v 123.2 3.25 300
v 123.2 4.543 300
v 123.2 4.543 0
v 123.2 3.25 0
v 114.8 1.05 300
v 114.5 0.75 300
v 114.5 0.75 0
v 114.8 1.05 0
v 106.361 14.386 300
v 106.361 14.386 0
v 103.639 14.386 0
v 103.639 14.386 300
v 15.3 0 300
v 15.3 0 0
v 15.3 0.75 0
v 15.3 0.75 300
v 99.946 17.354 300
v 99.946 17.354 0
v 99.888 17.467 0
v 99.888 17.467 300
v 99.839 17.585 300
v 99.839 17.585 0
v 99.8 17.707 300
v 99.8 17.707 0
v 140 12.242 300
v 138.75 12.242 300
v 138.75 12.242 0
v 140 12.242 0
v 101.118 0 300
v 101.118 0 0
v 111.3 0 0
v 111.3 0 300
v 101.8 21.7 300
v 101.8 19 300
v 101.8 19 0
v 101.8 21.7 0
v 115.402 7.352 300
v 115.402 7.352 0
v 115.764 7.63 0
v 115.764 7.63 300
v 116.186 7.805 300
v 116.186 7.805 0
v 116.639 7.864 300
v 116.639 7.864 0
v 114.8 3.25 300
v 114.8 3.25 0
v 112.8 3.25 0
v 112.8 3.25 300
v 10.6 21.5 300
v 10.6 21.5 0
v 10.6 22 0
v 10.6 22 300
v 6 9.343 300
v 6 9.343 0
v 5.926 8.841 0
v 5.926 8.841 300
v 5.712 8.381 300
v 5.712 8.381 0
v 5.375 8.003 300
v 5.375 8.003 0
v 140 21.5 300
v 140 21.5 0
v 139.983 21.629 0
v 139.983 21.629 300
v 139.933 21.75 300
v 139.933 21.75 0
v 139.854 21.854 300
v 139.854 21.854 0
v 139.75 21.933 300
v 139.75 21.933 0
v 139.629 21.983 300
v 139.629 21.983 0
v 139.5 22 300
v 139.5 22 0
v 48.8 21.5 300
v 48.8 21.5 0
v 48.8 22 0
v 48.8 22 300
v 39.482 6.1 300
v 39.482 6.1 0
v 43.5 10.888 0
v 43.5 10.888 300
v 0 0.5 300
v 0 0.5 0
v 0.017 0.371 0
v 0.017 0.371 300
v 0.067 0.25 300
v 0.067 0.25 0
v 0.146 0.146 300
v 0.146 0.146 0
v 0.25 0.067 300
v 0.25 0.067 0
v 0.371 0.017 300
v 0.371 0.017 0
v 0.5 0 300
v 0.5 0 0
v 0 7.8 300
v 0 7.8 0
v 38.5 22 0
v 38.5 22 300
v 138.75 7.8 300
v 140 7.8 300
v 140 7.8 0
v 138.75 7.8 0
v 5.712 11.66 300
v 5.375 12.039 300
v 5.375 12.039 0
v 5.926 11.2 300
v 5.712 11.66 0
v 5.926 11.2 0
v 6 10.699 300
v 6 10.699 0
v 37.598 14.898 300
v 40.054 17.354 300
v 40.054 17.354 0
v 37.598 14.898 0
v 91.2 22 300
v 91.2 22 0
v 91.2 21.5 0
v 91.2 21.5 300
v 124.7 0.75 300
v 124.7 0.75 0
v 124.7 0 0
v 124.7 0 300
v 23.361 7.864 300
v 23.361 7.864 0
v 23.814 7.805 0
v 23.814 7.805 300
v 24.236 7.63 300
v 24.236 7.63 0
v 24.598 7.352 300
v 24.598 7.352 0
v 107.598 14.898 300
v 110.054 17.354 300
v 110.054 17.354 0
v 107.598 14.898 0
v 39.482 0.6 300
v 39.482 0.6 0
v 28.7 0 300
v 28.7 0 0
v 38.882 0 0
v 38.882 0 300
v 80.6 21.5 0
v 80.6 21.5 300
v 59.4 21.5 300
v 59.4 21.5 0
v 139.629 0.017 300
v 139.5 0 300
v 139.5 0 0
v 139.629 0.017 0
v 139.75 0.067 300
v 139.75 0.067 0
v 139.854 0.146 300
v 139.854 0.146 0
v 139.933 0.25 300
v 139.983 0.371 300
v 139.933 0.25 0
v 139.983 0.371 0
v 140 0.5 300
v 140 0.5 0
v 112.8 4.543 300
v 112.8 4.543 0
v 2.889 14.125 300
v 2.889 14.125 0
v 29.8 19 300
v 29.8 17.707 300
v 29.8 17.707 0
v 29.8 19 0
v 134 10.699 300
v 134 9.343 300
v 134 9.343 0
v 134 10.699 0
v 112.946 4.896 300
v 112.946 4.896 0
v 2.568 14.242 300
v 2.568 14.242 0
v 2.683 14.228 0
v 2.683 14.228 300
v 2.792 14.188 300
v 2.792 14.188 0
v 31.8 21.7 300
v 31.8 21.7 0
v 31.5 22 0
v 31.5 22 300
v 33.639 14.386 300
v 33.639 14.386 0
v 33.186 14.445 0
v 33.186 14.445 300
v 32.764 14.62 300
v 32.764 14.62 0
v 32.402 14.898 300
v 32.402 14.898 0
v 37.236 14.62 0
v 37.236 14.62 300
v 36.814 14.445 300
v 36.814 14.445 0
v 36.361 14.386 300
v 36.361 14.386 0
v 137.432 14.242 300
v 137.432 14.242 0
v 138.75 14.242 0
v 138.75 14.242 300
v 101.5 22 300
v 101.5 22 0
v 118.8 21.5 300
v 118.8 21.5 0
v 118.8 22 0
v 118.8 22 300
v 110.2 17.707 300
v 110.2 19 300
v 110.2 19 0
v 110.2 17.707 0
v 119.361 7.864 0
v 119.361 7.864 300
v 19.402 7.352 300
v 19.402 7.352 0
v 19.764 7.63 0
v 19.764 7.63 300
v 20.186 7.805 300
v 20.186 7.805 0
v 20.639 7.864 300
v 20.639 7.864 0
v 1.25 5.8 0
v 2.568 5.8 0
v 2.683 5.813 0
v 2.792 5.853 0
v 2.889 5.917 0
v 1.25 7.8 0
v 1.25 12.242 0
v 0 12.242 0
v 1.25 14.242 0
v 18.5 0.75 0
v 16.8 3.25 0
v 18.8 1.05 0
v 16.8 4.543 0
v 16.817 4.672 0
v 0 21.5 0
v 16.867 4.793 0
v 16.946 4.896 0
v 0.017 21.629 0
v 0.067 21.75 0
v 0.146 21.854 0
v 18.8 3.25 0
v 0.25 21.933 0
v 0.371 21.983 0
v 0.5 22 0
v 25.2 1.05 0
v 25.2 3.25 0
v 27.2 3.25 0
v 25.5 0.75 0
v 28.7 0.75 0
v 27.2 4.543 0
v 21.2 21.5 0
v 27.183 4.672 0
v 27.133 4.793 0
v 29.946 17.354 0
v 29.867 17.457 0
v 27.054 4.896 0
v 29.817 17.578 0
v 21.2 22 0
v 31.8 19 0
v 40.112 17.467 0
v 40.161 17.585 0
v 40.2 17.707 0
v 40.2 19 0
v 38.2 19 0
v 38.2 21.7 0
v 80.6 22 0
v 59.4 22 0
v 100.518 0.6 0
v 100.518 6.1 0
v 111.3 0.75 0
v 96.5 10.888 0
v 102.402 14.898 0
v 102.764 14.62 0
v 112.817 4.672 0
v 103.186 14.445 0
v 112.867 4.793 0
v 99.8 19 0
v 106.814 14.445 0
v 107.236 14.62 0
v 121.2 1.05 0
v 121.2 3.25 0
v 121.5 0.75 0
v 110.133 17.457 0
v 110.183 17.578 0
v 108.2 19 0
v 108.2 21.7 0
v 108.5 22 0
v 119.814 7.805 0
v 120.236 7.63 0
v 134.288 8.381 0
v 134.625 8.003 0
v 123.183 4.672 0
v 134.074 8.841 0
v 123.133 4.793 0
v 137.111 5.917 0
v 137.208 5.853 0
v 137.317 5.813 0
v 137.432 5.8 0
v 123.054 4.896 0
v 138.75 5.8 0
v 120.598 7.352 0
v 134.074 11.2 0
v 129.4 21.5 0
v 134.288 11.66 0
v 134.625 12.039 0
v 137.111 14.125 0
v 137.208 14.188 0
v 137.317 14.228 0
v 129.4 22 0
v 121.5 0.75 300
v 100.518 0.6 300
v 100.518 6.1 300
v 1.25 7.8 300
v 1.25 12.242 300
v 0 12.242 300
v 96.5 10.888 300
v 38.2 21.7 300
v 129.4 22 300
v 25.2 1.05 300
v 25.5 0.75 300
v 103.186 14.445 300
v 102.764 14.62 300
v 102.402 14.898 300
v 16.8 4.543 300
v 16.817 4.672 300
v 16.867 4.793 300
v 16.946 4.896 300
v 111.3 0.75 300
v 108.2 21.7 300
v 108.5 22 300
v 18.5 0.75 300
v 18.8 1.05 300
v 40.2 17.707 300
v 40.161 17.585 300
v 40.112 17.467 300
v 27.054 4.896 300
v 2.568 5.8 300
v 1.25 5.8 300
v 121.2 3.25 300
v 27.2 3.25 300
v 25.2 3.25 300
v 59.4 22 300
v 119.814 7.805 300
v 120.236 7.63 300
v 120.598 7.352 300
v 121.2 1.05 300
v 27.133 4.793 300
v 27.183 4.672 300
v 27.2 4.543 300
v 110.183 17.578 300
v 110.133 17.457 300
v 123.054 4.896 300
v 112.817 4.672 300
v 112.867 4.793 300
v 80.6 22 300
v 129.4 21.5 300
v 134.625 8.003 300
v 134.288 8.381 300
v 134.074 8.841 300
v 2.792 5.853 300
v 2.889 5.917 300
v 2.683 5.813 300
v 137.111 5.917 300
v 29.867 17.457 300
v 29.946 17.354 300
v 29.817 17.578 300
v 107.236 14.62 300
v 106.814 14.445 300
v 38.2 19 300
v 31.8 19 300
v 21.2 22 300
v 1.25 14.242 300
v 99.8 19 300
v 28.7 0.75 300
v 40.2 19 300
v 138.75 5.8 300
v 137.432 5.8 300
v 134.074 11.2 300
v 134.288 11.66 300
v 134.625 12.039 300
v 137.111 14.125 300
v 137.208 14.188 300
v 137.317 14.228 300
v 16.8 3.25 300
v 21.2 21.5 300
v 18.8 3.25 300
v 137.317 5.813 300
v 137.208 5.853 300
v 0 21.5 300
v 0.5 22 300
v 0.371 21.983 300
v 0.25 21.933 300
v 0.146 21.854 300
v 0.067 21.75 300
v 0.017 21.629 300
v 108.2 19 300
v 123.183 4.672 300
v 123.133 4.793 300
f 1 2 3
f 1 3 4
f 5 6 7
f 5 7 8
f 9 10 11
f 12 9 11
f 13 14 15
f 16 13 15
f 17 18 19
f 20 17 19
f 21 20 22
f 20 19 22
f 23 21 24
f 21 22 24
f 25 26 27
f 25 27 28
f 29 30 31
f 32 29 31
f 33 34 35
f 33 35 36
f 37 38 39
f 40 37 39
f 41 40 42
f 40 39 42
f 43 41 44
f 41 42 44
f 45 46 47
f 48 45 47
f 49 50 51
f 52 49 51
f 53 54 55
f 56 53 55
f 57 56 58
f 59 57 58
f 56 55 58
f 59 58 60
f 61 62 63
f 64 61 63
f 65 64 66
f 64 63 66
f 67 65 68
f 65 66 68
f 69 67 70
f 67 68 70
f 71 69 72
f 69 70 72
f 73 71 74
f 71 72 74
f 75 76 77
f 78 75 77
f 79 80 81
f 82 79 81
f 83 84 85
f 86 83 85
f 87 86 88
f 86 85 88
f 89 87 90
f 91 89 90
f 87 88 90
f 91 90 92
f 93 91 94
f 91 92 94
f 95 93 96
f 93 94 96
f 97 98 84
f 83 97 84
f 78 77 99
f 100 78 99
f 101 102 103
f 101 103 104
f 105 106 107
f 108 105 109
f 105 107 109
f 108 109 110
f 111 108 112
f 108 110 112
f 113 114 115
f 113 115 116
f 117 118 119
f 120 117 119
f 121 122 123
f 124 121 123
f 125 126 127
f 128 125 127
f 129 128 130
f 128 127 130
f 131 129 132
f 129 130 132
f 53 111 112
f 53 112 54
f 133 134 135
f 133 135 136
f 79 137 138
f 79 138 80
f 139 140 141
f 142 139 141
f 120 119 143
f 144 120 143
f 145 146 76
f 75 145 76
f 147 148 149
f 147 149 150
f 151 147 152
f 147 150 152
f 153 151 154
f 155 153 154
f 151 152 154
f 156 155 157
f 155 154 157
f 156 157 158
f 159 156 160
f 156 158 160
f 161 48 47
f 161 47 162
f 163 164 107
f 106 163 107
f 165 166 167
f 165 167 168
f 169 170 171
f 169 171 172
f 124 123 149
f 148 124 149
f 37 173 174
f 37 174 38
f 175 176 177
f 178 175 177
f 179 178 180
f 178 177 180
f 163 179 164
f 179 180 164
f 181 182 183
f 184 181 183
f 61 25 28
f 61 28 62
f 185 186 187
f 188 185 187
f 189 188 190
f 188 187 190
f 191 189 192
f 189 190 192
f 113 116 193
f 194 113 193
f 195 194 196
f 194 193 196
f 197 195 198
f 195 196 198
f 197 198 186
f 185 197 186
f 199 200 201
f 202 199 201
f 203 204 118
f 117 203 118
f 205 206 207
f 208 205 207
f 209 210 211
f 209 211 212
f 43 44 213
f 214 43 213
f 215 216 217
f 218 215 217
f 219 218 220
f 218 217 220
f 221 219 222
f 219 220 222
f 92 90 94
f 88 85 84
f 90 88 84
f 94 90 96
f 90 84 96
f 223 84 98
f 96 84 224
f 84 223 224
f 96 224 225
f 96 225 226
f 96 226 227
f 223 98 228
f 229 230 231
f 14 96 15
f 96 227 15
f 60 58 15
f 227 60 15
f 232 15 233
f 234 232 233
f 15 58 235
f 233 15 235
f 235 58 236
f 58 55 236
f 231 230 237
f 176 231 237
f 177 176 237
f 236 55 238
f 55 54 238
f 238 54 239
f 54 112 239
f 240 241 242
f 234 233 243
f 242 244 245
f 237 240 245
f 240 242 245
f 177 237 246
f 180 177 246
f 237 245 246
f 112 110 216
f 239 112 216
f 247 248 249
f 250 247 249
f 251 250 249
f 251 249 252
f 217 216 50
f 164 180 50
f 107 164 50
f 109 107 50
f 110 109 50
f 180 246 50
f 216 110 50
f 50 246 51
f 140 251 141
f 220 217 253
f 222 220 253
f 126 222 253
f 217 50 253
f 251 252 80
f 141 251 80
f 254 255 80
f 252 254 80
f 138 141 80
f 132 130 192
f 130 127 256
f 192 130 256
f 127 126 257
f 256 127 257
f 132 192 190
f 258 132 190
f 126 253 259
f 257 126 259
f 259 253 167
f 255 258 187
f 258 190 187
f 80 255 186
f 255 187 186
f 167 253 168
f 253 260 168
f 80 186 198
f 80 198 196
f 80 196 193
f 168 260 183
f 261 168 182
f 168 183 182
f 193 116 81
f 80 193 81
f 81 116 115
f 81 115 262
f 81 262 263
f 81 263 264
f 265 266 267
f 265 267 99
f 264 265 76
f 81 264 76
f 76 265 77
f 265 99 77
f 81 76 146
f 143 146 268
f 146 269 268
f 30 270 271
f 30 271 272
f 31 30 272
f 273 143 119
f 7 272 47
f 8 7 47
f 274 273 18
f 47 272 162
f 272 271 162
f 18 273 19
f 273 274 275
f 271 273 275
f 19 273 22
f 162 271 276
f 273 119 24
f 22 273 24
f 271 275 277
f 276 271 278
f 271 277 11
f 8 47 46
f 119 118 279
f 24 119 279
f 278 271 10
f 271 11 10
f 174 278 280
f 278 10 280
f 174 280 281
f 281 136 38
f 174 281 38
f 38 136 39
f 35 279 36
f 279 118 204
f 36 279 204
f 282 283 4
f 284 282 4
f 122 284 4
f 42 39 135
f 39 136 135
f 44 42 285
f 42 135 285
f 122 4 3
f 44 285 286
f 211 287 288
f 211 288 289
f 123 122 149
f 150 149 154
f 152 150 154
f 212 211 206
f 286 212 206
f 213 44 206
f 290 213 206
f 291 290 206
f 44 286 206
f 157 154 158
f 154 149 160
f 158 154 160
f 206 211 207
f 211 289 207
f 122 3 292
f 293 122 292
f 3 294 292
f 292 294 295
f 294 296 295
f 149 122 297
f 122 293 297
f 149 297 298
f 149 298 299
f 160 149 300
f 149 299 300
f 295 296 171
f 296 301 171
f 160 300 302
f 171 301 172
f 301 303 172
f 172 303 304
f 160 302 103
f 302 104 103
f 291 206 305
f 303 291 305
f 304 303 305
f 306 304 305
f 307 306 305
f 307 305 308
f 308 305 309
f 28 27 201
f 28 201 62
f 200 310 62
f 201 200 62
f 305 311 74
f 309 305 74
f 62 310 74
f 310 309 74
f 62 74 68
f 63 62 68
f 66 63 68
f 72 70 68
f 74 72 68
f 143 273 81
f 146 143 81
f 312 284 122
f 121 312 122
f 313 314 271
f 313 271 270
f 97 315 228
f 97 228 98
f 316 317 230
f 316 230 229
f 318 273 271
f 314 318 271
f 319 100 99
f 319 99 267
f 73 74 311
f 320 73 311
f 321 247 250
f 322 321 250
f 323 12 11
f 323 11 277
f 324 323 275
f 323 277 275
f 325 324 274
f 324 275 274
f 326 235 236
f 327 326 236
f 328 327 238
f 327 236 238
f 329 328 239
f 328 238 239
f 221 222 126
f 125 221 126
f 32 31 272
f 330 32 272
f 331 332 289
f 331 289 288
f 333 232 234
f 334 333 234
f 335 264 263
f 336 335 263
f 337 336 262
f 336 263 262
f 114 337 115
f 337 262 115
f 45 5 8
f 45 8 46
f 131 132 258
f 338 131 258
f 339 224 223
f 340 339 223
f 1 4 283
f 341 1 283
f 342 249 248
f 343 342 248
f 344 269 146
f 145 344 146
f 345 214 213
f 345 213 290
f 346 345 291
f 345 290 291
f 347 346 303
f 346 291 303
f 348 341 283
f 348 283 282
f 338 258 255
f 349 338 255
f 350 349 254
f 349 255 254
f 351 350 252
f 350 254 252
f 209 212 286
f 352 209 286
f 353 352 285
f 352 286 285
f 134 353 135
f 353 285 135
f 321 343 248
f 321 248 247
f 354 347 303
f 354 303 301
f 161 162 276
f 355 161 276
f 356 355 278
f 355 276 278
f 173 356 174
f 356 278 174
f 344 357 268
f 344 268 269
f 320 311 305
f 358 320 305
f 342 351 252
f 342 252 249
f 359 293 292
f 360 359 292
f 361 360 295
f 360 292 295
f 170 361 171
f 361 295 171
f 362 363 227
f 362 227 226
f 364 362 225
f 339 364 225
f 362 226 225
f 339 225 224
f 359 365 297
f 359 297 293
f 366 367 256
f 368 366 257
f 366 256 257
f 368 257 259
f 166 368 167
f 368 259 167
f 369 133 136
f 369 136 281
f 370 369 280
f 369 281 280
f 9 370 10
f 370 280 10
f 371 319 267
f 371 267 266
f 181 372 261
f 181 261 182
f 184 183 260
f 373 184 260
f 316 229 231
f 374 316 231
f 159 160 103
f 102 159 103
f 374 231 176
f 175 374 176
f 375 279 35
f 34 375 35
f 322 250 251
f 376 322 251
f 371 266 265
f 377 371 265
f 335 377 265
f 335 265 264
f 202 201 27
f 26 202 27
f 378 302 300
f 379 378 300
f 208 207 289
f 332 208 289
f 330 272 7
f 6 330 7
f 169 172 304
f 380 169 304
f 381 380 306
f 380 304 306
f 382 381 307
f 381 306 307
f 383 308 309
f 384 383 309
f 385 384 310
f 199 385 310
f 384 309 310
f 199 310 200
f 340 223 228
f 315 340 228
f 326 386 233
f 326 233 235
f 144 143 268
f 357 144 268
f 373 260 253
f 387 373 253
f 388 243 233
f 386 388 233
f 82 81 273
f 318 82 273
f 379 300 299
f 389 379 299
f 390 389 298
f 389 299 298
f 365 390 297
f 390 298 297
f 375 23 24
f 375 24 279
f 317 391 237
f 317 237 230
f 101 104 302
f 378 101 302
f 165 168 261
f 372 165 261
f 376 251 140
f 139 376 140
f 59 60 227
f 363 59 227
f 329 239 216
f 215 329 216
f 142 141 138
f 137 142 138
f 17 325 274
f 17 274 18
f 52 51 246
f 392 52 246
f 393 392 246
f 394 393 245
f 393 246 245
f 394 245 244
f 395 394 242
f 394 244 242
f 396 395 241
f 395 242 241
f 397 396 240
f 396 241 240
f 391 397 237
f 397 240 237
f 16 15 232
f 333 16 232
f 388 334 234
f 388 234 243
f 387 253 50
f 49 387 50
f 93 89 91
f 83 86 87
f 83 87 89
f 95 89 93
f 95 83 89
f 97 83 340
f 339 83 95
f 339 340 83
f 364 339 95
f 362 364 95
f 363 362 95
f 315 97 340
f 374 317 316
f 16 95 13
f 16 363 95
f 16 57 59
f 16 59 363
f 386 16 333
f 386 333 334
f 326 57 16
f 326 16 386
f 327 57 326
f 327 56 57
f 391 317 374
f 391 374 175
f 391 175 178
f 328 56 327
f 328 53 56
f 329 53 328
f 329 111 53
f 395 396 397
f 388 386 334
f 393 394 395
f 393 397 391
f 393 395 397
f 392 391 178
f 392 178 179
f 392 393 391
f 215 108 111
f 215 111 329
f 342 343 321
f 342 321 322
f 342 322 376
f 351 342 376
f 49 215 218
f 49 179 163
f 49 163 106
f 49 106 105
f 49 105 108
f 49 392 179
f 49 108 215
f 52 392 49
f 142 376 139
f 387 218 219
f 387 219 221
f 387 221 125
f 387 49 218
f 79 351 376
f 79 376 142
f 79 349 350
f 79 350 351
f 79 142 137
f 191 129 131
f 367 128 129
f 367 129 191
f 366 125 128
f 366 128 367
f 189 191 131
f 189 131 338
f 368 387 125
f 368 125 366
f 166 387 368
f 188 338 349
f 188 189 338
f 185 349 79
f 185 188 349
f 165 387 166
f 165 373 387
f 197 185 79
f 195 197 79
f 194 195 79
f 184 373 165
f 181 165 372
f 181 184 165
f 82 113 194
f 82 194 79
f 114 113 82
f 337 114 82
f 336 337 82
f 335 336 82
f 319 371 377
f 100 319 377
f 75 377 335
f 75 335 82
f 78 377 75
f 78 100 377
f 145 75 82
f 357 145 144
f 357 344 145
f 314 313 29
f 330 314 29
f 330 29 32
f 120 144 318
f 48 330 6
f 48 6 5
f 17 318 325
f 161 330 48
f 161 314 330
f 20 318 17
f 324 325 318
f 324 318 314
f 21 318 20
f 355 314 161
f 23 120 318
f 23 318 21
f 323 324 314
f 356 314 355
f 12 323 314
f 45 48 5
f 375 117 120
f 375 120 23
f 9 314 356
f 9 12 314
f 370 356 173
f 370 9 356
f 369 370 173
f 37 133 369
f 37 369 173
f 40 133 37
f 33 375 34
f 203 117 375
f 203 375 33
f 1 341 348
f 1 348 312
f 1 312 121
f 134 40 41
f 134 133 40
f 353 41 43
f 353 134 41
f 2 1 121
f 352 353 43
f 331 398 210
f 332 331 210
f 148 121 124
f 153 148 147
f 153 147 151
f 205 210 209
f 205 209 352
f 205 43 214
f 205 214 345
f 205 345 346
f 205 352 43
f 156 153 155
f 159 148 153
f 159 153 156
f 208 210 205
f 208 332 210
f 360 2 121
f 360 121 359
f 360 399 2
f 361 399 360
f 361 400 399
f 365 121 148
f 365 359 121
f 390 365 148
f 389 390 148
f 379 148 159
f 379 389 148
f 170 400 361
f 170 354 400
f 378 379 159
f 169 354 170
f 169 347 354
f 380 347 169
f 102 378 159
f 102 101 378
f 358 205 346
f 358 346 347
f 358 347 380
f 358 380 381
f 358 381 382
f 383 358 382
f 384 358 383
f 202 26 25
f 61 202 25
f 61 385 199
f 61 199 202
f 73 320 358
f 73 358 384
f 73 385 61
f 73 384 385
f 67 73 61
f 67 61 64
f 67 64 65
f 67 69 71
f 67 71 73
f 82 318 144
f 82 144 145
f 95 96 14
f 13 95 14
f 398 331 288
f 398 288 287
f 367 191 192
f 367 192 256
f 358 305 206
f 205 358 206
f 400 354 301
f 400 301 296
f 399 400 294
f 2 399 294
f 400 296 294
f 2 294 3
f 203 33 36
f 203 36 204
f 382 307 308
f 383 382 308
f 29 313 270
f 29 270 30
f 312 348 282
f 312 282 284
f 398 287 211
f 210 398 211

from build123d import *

# Parameters (mm, degrees)
Y_KSEKLIK_EKSTR_ZYON1_DEPTH = 300


with BuildPart() as part:
    # Çizim1 → Yükseklik-Ekstrüzyon1 (new body)
    with BuildSketch(Plane.XY):
        with BuildLine():
            Line((0.5, 0), (15.3, 0))
            Line((15.3, 0), (15.3, 0.75))
            Line((15.3, 0.75), (18.5, 0.75))
            Line((18.5, 0.75), (18.8, 1.05))
            Line((18.8, 1.05), (18.8, 3.25))
            Line((18.8, 3.25), (16.8, 3.25))
            Line((16.8, 3.25), (16.8, 4.542893219))
            ThreePointArc((16.8, 4.542893219), (16.838060234, 4.734234935), (16.946446609, 4.896446609))
            Line((16.946446609, 4.896446609), (19.401845417, 7.351845417))
            ThreePointArc((19.401845417, 7.351845417), (19.969586278, 7.731197732), (20.639282284, 7.86440855))
            Line((20.639282284, 7.86440855), (23.360717716, 7.86440855))
            ThreePointArc((23.360717716, 7.86440855), (24.030413722, 7.731197732), (24.598154583, 7.351845417))
            Line((24.598154583, 7.351845417), (27.053553391, 4.896446609))
            ThreePointArc((27.053553391, 4.896446609), (27.161939766, 4.734234935), (27.2, 4.542893219))
            Line((27.2, 4.542893219), (27.2, 3.25))
            Line((27.2, 3.25), (25.2, 3.25))
            Line((25.2, 3.25), (25.2, 1.05))
            Line((25.2, 1.05), (25.5, 0.75))
            Line((25.5, 0.75), (28.7, 0.75))
            Line((28.7, 0.75), (28.7, 0))
            Line((28.7, 0), (38.882330038, 0))
            Line((38.882330038, 0), (39.482330038, 0.6))
            Line((39.482330038, 0.6), (39.482330038, 6.1))
            Line((39.482330038, 6.1), (43.5, 10.888072611))
            Line((43.5, 10.888072611), (96.5, 10.888072611))
            Line((96.5, 10.888072611), (100.517669962, 6.1))
            Line((100.517669962, 6.1), (100.517669962, 0.6))
            Line((100.517669962, 0.6), (101.117669962, 0))
            Line((101.117669962, 0), (111.3, 0))
            Line((111.3, 0), (111.3, 0.75))
            Line((111.3, 0.75), (114.5, 0.75))
            Line((114.5, 0.75), (114.8, 1.05))
            Line((114.8, 1.05), (114.8, 3.25))
            Line((114.8, 3.25), (112.8, 3.25))
            Line((112.8, 3.25), (112.8, 4.542893219))
            ThreePointArc((112.8, 4.542893219), (112.838060234, 4.734234935), (112.946446609, 4.896446609))
            Line((112.946446609, 4.896446609), (115.401845417, 7.351845417))
            ThreePointArc((115.401845417, 7.351845417), (115.969586278, 7.731197732), (116.639282284, 7.86440855))
            Line((116.639282284, 7.86440855), (119.360717716, 7.86440855))
            ThreePointArc((119.360717716, 7.86440855), (120.030413722, 7.731197732), (120.598154583, 7.351845417))
            Line((120.598154583, 7.351845417), (123.053553391, 4.896446609))
            ThreePointArc((123.053553391, 4.896446609), (123.161939766, 4.734234935), (123.2, 4.542893219))
            Line((123.2, 4.542893219), (123.2, 3.25))
            Line((123.2, 3.25), (121.2, 3.25))
            Line((121.2, 3.25), (121.2, 1.05))
            Line((121.2, 1.05), (121.5, 0.75))
            Line((121.5, 0.75), (124.7, 0.75))
            Line((124.7, 0.75), (124.7, 0))
            Line((124.7, 0), (139.5, 0))
            ThreePointArc((139.5, 0), (139.853553391, 0.146446609), (140, 0.5))
            Line((140, 0.5), (140, 7.8))
            Line((140, 7.8), (138.75, 7.8))
            Line((138.75, 7.8), (138.75, 5.8))
            Line((138.75, 5.8), (137.431985117, 5.8))
            ThreePointArc((137.431985117, 5.8), (137.260975045, 5.83015369), (137.110591312, 5.916977778))
            Line((137.110591312, 5.916977778), (134.625121683, 8.002534428))
            ThreePointArc((134.625121683, 8.002534428), (134.163961373, 8.603530245), (134, 9.343112203))
            Line((134, 9.343112203), (134, 10.698544282))
            ThreePointArc((134, 10.698544282), (134.163961373, 11.43812624), (134.625121683, 12.039122058))
            Line((134.625121683, 12.039122058), (137.110591312, 14.124678707))
            ThreePointArc((137.110591312, 14.124678707), (137.260975045, 14.211502796), (137.431985117, 14.241656485))
            Line((137.431985117, 14.241656485), (138.75, 14.241656485))
            Line((138.75, 14.241656485), (138.75, 12.241656485))
            Line((138.75, 12.241656485), (140, 12.241656485))
            Line((140, 12.241656485), (140, 21.5))
            ThreePointArc((140, 21.5), (139.853553391, 21.853553391), (139.5, 22))
            Line((139.5, 22), (129.4, 22))
            Line((129.4, 22), (129.4, 21.5))
            Line((129.4, 21.5), (118.8, 21.5))
            Line((118.8, 21.5), (118.8, 22))
            Line((118.8, 22), (108.5, 22))
            Line((108.5, 22), (108.2, 21.7))
            Line((108.2, 21.7), (108.2, 19))
            Line((108.2, 19), (110.2, 19))
            Line((110.2, 19), (110.2, 17.707106781))
            ThreePointArc((110.2, 17.707106781), (110.161939766, 17.515765065), (110.053553391, 17.353553391))
            Line((110.053553391, 17.353553391), (107.598154583, 14.898154583))
            ThreePointArc((107.598154583, 14.898154583), (107.030413722, 14.518802268), (106.360717716, 14.38559145))
            Line((106.360717716, 14.38559145), (103.639282284, 14.38559145))
            ThreePointArc((103.639282284, 14.38559145), (102.969586278, 14.518802268), (102.401845417, 14.898154583))
            Line((102.401845417, 14.898154583), (99.946446609, 17.353553391))
            ThreePointArc((99.946446609, 17.353553391), (99.86234478, 17.525824053), (99.8, 17.707106781))
            Line((99.8, 17.707106781), (99.8, 19))
            Line((99.8, 19), (101.8, 19))
            Line((101.8, 19), (101.8, 21.7))
            Line((101.8, 21.7), (101.5, 22))
            Line((101.5, 22), (91.2, 22))
            Line((91.2, 22), (91.2, 21.5))
            Line((91.2, 21.5), (80.6, 21.5))
            Line((80.6, 21.5), (80.6, 22))
            Line((80.6, 22), (59.4, 22))
            Line((59.4, 22), (59.4, 21.5))
            Line((59.4, 21.5), (48.8, 21.5))
            Line((48.8, 21.5), (48.8, 22))
            Line((48.8, 22), (38.5, 22))
            Line((38.5, 22), (38.2, 21.7))
            Line((38.2, 21.7), (38.2, 19))
            Line((38.2, 19), (40.2, 19))
            Line((40.2, 19), (40.2, 17.707106781))
            ThreePointArc((40.2, 17.707106781), (40.13765522, 17.525824053), (40.053553391, 17.353553391))
            Line((40.053553391, 17.353553391), (37.598154583, 14.898154583))
            ThreePointArc((37.598154583, 14.898154583), (37.030413722, 14.518802268), (36.360717716, 14.38559145))
            Line((36.360717716, 14.38559145), (33.639282284, 14.38559145))
            ThreePointArc((33.639282284, 14.38559145), (32.969586278, 14.518802268), (32.401845417, 14.898154583))
            Line((32.401845417, 14.898154583), (29.946446609, 17.353553391))
            ThreePointArc((29.946446609, 17.353553391), (29.838060234, 17.515765065), (29.8, 17.707106781))
            Line((29.8, 17.707106781), (29.8, 19))
            Line((29.8, 19), (31.8, 19))
            Line((31.8, 19), (31.8, 21.7))
            Line((31.8, 21.7), (31.5, 22))
            Line((31.5, 22), (21.2, 22))
            Line((21.2, 22), (21.2, 21.5))
            Line((21.2, 21.5), (10.6, 21.5))
            Line((10.6, 21.5), (10.6, 22))
            Line((10.6, 22), (0.5, 22))
            ThreePointArc((0.5, 22), (0.146446609, 21.853553391), (0, 21.5))
            Line((0, 21.5), (0, 12.241656485))
            Line((0, 12.241656485), (1.25, 12.241656485))
            Line((1.25, 12.241656485), (1.25, 14.241656485))
            Line((1.25, 14.241656485), (2.568014883, 14.241656485))
            ThreePointArc((2.568014883, 14.241656485), (2.739024955, 14.211502796), (2.889408688, 14.124678707))
            Line((2.889408688, 14.124678707), (5.374878317, 12.039122058))
            ThreePointArc((5.374878317, 12.039122058), (5.836038627, 11.43812624), (6, 10.698544282))
            Line((6, 10.698544282), (6, 9.343112203))
            ThreePointArc((6, 9.343112203), (5.836038627, 8.603530245), (5.374878317, 8.002534428))
            Line((5.374878317, 8.002534428), (2.889408688, 5.916977778))
            ThreePointArc((2.889408688, 5.916977778), (2.739024955, 5.83015369), (2.568014883, 5.8))
            Line((2.568014883, 5.8), (1.25, 5.8))
            Line((1.25, 5.8), (1.25, 7.8))
            Line((1.25, 7.8), (0, 7.8))
            Line((0, 7.8), (0, 0.5))
            ThreePointArc((0, 0.5), (0.146446609, 0.146446609), (0.5, 0))
        make_face()
    extrude(amount=Y_KSEKLIK_EKSTR_ZYON1_DEPTH)


solid = part.part
